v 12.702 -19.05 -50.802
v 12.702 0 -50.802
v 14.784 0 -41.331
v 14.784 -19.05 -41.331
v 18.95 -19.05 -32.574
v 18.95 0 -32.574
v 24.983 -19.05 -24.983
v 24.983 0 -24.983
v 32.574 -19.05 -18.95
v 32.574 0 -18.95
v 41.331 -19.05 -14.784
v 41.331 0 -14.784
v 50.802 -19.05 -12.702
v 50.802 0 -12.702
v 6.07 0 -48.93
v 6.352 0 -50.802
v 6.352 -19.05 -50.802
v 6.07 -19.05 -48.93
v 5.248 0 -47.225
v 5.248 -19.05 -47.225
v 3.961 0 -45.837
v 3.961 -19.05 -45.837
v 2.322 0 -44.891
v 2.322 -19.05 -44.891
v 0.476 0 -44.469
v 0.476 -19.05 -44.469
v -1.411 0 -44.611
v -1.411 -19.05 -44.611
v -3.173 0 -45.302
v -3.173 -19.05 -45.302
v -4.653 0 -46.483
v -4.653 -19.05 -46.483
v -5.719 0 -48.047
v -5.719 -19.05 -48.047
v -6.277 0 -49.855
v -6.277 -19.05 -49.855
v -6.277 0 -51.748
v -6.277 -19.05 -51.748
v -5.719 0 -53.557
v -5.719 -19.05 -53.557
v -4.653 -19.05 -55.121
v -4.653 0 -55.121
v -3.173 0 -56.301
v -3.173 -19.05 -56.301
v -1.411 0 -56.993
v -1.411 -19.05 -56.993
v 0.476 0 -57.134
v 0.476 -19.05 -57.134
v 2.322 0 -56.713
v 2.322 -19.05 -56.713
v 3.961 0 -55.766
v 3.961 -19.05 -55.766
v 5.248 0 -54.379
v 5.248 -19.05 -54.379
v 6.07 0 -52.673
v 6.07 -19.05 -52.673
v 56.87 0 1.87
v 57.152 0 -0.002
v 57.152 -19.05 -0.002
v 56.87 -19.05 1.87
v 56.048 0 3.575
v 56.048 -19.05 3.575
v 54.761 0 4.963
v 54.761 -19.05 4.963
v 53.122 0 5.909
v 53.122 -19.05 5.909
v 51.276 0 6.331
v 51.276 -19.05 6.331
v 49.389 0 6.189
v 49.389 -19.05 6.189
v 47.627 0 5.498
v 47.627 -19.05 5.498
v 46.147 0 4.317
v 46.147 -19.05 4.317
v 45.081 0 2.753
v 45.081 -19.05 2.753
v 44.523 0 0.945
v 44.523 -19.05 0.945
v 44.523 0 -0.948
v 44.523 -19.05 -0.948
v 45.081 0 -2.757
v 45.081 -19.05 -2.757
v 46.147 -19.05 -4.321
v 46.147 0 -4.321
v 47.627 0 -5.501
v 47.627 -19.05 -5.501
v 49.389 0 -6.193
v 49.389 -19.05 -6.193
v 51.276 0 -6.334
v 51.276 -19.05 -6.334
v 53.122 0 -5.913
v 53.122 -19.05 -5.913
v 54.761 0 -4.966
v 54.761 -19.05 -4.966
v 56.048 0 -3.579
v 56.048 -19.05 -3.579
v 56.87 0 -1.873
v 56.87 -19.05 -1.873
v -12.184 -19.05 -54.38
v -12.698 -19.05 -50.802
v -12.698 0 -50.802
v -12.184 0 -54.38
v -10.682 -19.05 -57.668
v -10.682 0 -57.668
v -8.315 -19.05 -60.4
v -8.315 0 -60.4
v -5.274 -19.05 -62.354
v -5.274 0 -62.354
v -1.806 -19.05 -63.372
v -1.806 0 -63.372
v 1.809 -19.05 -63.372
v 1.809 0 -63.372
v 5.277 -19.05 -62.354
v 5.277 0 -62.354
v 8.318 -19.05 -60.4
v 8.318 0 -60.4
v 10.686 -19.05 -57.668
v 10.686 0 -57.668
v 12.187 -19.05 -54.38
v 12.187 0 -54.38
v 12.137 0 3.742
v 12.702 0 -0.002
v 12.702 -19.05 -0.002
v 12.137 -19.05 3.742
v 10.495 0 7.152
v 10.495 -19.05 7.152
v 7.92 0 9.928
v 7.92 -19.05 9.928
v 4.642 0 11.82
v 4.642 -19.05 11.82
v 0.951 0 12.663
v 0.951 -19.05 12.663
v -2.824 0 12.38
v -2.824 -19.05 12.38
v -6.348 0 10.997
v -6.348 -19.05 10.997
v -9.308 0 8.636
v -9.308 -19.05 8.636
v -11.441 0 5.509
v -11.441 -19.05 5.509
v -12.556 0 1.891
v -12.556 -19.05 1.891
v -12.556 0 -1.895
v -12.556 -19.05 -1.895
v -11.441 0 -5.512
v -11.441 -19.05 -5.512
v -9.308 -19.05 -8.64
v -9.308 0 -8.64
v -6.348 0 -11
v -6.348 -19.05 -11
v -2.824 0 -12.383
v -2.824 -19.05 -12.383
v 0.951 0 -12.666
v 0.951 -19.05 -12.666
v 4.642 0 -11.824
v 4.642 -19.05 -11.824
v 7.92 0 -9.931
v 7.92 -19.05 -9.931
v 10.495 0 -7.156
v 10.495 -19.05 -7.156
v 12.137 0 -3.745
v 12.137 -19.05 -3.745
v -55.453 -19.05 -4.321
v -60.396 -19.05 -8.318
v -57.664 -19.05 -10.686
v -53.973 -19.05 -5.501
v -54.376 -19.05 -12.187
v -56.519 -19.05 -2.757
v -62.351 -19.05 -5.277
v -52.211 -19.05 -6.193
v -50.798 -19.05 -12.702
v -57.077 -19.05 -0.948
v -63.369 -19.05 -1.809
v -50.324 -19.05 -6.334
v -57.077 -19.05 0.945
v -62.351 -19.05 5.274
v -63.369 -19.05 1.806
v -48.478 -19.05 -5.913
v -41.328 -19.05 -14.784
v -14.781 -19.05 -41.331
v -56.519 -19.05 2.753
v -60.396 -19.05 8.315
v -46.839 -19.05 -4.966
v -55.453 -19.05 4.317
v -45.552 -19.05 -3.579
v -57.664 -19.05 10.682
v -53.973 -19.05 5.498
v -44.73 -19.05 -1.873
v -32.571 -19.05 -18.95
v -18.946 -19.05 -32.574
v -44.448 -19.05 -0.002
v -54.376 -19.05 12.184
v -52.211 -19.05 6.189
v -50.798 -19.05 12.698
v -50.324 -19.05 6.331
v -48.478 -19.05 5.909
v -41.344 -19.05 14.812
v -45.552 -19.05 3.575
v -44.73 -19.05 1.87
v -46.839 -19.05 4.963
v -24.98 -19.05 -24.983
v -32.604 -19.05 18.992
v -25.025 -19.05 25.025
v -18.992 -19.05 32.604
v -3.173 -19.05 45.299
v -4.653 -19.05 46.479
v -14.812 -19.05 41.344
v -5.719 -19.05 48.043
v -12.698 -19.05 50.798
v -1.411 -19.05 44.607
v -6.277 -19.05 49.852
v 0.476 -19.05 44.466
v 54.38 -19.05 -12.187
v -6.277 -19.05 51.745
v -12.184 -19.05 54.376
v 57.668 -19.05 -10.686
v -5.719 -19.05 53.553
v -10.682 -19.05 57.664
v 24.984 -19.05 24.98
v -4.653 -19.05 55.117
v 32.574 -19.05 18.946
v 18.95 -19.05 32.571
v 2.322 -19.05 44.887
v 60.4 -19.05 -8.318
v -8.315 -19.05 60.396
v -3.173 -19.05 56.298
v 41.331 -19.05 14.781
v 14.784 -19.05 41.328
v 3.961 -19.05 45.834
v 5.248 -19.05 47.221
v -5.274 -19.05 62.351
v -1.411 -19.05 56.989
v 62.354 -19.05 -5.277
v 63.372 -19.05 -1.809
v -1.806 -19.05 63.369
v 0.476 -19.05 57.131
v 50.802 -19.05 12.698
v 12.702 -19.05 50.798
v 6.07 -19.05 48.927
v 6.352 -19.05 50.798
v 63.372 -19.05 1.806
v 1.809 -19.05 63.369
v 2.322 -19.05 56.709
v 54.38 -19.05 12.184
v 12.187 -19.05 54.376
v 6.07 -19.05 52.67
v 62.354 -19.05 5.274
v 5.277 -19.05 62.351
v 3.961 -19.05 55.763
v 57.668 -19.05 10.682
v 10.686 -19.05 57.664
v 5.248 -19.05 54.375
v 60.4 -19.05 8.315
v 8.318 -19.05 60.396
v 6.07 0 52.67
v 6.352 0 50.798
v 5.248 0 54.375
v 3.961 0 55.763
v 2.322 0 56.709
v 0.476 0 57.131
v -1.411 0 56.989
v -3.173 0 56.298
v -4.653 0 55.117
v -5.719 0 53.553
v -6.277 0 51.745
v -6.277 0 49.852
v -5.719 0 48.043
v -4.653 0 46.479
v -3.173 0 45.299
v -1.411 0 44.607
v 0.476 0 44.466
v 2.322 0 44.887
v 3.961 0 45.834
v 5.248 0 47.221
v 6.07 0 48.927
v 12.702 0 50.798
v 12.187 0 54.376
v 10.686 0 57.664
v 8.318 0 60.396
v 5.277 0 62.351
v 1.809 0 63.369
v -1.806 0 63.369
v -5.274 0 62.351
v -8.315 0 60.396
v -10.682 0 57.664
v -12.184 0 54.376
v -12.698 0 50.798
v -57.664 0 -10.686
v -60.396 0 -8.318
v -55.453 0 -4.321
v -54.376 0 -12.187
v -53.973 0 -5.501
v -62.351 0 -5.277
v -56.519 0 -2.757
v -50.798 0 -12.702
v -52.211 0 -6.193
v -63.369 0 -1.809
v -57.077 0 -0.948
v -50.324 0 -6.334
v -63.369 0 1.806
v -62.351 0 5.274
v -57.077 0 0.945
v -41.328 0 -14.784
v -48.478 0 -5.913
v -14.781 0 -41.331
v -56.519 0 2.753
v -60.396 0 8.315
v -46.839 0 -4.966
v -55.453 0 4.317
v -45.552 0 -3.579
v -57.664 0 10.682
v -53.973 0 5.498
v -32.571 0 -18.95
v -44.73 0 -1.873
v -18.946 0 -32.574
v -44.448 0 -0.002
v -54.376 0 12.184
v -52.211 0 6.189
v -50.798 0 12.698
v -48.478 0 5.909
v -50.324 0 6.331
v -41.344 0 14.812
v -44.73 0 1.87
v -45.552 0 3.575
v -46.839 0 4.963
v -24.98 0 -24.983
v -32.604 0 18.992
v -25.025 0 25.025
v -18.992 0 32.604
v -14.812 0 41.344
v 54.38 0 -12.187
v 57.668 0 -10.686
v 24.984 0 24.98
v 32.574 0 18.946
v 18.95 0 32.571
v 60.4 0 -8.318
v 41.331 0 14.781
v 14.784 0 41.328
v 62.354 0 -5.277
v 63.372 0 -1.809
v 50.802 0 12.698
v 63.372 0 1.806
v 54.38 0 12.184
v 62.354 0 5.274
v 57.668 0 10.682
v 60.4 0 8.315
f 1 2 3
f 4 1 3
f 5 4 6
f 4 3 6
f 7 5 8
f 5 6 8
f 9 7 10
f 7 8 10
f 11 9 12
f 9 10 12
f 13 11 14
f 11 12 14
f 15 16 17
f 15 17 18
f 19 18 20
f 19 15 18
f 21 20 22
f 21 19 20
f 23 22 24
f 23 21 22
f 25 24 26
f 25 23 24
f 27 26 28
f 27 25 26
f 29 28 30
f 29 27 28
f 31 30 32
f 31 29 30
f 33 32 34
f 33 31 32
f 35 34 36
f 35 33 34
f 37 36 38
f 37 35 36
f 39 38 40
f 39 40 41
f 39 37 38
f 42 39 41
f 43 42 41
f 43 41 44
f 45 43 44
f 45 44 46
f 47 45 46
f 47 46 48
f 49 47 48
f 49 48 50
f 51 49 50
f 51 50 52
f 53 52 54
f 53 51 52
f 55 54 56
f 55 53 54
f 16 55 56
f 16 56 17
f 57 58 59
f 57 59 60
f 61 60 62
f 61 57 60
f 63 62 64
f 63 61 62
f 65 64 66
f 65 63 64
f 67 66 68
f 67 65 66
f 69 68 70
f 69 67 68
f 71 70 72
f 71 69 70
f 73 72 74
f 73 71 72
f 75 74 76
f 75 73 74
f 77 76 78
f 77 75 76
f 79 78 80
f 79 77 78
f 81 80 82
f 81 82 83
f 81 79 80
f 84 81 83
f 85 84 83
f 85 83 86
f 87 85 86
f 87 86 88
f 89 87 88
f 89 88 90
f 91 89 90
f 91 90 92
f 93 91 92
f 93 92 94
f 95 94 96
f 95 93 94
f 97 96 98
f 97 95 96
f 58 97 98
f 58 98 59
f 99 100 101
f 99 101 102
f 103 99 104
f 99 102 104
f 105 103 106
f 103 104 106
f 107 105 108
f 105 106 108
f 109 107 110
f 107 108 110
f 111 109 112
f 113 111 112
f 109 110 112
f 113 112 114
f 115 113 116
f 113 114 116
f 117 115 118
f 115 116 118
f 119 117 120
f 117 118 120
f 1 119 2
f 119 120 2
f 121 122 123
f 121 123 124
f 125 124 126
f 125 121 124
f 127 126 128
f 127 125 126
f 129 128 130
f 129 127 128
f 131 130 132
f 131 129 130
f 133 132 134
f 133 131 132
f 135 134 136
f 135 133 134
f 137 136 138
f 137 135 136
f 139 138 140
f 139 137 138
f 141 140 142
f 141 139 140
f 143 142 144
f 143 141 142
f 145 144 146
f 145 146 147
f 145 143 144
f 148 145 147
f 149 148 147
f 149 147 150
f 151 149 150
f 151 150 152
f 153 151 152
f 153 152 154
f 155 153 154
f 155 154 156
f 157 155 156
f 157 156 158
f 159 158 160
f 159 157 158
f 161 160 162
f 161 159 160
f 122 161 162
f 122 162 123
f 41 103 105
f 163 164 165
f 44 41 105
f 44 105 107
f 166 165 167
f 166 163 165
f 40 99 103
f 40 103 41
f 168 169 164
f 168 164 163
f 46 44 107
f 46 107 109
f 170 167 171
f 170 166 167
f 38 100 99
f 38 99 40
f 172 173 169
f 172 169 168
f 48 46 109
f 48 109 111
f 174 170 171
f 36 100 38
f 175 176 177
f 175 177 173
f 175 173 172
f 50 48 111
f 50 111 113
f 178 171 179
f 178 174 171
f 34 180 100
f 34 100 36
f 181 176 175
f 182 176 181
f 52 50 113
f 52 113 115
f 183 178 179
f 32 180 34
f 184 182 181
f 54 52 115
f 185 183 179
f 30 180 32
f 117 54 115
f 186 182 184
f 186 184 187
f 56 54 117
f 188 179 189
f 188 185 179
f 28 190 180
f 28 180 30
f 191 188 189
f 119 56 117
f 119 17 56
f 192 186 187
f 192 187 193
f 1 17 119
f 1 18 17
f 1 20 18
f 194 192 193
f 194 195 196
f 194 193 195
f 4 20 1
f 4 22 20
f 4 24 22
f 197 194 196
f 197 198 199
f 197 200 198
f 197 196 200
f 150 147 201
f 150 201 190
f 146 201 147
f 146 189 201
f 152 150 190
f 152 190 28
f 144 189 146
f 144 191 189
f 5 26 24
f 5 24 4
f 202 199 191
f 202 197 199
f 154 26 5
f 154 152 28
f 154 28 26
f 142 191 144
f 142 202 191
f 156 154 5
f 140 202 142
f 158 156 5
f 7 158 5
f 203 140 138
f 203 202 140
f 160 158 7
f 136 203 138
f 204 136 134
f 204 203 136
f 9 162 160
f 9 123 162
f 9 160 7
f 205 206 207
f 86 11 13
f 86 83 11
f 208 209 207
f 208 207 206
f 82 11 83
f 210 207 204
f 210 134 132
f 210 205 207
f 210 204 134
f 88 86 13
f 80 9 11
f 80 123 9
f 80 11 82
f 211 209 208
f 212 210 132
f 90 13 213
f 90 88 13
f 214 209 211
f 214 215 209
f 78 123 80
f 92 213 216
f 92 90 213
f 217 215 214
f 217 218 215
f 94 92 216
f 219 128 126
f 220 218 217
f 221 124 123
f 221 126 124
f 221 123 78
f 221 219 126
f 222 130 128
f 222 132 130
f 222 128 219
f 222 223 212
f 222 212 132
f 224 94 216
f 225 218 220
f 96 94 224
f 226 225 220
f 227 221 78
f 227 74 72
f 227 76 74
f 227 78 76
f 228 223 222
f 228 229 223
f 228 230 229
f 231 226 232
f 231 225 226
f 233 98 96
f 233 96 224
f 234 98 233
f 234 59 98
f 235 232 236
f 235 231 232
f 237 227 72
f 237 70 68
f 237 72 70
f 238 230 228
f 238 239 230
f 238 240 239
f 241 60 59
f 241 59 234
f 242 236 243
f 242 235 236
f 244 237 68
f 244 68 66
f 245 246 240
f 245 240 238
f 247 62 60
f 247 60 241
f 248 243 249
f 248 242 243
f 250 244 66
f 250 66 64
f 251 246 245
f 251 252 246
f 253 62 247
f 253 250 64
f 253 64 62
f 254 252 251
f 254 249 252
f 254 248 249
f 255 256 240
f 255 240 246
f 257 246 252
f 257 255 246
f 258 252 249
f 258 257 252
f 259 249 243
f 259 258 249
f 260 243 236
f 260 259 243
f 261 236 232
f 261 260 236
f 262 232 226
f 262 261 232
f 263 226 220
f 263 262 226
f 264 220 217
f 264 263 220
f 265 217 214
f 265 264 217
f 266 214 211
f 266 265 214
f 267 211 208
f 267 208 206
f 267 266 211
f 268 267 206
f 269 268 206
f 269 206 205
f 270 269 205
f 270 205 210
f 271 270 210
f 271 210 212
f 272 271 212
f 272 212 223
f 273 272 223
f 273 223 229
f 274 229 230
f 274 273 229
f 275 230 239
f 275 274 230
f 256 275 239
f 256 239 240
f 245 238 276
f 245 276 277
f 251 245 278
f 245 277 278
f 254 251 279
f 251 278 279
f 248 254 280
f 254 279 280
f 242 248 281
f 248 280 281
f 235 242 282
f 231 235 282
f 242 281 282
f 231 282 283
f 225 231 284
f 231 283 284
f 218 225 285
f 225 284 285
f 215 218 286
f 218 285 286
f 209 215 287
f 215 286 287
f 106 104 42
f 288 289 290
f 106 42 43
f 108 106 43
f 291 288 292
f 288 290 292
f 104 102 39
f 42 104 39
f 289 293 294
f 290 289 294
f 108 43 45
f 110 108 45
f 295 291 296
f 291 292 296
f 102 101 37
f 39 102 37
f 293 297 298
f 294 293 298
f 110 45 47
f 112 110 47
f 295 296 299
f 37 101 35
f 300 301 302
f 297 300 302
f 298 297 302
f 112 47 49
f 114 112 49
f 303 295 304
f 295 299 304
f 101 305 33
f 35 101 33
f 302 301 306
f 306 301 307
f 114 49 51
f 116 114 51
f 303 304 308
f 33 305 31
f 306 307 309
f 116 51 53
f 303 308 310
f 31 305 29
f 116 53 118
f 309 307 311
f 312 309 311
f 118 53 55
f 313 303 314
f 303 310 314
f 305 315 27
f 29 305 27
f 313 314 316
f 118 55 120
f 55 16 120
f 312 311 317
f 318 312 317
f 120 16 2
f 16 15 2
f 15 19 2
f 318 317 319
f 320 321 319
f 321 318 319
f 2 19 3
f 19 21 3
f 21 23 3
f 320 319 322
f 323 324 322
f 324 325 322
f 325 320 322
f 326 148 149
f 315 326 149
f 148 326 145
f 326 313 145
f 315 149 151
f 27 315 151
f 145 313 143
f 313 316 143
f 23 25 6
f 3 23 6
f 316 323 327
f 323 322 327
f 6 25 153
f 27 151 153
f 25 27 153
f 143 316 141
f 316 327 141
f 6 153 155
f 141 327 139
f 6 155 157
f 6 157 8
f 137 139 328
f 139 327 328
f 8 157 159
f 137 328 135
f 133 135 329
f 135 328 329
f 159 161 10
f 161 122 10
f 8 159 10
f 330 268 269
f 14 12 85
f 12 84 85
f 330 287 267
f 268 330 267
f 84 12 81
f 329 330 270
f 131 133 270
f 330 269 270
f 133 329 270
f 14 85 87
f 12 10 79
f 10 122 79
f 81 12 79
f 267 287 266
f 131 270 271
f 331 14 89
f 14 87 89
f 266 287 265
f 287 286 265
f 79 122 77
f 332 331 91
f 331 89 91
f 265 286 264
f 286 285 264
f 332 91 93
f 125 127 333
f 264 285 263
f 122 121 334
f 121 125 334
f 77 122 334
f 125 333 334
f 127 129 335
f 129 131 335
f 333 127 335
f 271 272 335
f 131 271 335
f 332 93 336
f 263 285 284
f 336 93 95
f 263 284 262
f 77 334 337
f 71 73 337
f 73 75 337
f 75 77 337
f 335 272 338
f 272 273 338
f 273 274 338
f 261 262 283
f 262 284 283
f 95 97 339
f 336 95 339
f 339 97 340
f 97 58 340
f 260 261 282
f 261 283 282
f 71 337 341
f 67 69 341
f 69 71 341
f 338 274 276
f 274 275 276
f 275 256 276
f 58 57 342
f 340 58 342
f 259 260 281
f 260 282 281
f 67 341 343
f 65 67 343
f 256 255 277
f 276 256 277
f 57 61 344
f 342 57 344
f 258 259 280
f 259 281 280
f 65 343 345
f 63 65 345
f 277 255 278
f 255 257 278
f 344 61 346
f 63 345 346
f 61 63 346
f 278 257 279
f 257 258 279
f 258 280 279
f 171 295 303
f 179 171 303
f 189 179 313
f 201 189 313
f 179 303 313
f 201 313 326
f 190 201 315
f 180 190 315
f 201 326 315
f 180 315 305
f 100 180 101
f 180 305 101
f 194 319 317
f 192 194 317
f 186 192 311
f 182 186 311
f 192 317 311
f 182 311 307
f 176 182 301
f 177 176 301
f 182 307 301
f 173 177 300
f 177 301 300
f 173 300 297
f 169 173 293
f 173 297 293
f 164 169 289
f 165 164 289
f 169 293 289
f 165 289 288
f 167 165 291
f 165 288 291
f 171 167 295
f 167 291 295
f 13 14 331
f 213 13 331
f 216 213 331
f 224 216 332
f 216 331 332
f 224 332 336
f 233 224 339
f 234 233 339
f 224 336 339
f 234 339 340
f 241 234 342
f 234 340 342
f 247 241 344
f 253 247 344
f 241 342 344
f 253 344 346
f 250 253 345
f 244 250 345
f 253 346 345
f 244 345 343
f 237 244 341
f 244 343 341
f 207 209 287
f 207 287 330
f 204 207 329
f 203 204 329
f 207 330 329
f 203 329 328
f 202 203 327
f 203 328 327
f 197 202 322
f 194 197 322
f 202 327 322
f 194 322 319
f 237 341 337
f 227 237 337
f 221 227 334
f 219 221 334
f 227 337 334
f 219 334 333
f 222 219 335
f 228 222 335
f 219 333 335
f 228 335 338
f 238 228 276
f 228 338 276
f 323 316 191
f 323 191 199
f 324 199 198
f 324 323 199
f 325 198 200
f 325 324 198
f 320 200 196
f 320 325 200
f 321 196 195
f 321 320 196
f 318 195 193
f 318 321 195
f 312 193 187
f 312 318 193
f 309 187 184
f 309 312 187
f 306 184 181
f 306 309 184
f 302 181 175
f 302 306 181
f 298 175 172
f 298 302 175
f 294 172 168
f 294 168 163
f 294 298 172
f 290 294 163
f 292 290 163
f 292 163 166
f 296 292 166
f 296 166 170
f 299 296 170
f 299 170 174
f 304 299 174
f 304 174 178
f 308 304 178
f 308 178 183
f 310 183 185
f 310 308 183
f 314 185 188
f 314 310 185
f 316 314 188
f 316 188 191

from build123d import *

# Parameters (mm, degrees)
F0_R     = 6.35
F0_R_2   = 12.7
F1_DEPTH = 19.05


with BuildPart() as f1:
    # F0 (on Front) → F1 (new body)
    with BuildSketch(Plane.XZ):
        with BuildLine():
            ThreePointArc((-12.69828, 50.798278), (-25.024948, 25.024947), (-50.79828, 12.698278))
            ThreePointArc((-50.79828, 12.698278), (-63.49828, -0.001722), (-50.79828, -12.701722))
            ThreePointArc((-50.79828, -12.701722), (-24.980044, -24.983485), (-12.69828, -50.801722))
            ThreePointArc((-12.69828, -50.801722), (0.00172, -63.501722), (12.70172, -50.801722))
            ThreePointArc((12.70172, -50.801722), (24.983496, -24.983498), (50.80172, -12.701722))
            ThreePointArc((50.80172, -12.701722), (63.50172, -0.001722), (50.80172, 12.698278))
            ThreePointArc((50.80172, 12.698278), (24.983506, 24.980065), (12.70172, 50.798278))
            ThreePointArc((12.70172, 50.798278), (0.00172, 63.498278), (-12.69828, 50.798278))
        make_face()
        with Locations((0.00172, -50.801722)):
            Circle(F0_R, mode=Mode.SUBTRACT)
        with Locations((-50.79828, -0.001722)):
            Circle(F0_R, mode=Mode.SUBTRACT)
        with Locations((0.00172, -0.001722)):
            Circle(F0_R_2, mode=Mode.SUBTRACT)
        with Locations((0.00172, 50.798278)):
            Circle(F0_R, mode=Mode.SUBTRACT)
        with Locations((50.80172, -0.001722)):
            Circle(F0_R, mode=Mode.SUBTRACT)
    extrude(amount=F1_DEPTH)


solid = f1.part
